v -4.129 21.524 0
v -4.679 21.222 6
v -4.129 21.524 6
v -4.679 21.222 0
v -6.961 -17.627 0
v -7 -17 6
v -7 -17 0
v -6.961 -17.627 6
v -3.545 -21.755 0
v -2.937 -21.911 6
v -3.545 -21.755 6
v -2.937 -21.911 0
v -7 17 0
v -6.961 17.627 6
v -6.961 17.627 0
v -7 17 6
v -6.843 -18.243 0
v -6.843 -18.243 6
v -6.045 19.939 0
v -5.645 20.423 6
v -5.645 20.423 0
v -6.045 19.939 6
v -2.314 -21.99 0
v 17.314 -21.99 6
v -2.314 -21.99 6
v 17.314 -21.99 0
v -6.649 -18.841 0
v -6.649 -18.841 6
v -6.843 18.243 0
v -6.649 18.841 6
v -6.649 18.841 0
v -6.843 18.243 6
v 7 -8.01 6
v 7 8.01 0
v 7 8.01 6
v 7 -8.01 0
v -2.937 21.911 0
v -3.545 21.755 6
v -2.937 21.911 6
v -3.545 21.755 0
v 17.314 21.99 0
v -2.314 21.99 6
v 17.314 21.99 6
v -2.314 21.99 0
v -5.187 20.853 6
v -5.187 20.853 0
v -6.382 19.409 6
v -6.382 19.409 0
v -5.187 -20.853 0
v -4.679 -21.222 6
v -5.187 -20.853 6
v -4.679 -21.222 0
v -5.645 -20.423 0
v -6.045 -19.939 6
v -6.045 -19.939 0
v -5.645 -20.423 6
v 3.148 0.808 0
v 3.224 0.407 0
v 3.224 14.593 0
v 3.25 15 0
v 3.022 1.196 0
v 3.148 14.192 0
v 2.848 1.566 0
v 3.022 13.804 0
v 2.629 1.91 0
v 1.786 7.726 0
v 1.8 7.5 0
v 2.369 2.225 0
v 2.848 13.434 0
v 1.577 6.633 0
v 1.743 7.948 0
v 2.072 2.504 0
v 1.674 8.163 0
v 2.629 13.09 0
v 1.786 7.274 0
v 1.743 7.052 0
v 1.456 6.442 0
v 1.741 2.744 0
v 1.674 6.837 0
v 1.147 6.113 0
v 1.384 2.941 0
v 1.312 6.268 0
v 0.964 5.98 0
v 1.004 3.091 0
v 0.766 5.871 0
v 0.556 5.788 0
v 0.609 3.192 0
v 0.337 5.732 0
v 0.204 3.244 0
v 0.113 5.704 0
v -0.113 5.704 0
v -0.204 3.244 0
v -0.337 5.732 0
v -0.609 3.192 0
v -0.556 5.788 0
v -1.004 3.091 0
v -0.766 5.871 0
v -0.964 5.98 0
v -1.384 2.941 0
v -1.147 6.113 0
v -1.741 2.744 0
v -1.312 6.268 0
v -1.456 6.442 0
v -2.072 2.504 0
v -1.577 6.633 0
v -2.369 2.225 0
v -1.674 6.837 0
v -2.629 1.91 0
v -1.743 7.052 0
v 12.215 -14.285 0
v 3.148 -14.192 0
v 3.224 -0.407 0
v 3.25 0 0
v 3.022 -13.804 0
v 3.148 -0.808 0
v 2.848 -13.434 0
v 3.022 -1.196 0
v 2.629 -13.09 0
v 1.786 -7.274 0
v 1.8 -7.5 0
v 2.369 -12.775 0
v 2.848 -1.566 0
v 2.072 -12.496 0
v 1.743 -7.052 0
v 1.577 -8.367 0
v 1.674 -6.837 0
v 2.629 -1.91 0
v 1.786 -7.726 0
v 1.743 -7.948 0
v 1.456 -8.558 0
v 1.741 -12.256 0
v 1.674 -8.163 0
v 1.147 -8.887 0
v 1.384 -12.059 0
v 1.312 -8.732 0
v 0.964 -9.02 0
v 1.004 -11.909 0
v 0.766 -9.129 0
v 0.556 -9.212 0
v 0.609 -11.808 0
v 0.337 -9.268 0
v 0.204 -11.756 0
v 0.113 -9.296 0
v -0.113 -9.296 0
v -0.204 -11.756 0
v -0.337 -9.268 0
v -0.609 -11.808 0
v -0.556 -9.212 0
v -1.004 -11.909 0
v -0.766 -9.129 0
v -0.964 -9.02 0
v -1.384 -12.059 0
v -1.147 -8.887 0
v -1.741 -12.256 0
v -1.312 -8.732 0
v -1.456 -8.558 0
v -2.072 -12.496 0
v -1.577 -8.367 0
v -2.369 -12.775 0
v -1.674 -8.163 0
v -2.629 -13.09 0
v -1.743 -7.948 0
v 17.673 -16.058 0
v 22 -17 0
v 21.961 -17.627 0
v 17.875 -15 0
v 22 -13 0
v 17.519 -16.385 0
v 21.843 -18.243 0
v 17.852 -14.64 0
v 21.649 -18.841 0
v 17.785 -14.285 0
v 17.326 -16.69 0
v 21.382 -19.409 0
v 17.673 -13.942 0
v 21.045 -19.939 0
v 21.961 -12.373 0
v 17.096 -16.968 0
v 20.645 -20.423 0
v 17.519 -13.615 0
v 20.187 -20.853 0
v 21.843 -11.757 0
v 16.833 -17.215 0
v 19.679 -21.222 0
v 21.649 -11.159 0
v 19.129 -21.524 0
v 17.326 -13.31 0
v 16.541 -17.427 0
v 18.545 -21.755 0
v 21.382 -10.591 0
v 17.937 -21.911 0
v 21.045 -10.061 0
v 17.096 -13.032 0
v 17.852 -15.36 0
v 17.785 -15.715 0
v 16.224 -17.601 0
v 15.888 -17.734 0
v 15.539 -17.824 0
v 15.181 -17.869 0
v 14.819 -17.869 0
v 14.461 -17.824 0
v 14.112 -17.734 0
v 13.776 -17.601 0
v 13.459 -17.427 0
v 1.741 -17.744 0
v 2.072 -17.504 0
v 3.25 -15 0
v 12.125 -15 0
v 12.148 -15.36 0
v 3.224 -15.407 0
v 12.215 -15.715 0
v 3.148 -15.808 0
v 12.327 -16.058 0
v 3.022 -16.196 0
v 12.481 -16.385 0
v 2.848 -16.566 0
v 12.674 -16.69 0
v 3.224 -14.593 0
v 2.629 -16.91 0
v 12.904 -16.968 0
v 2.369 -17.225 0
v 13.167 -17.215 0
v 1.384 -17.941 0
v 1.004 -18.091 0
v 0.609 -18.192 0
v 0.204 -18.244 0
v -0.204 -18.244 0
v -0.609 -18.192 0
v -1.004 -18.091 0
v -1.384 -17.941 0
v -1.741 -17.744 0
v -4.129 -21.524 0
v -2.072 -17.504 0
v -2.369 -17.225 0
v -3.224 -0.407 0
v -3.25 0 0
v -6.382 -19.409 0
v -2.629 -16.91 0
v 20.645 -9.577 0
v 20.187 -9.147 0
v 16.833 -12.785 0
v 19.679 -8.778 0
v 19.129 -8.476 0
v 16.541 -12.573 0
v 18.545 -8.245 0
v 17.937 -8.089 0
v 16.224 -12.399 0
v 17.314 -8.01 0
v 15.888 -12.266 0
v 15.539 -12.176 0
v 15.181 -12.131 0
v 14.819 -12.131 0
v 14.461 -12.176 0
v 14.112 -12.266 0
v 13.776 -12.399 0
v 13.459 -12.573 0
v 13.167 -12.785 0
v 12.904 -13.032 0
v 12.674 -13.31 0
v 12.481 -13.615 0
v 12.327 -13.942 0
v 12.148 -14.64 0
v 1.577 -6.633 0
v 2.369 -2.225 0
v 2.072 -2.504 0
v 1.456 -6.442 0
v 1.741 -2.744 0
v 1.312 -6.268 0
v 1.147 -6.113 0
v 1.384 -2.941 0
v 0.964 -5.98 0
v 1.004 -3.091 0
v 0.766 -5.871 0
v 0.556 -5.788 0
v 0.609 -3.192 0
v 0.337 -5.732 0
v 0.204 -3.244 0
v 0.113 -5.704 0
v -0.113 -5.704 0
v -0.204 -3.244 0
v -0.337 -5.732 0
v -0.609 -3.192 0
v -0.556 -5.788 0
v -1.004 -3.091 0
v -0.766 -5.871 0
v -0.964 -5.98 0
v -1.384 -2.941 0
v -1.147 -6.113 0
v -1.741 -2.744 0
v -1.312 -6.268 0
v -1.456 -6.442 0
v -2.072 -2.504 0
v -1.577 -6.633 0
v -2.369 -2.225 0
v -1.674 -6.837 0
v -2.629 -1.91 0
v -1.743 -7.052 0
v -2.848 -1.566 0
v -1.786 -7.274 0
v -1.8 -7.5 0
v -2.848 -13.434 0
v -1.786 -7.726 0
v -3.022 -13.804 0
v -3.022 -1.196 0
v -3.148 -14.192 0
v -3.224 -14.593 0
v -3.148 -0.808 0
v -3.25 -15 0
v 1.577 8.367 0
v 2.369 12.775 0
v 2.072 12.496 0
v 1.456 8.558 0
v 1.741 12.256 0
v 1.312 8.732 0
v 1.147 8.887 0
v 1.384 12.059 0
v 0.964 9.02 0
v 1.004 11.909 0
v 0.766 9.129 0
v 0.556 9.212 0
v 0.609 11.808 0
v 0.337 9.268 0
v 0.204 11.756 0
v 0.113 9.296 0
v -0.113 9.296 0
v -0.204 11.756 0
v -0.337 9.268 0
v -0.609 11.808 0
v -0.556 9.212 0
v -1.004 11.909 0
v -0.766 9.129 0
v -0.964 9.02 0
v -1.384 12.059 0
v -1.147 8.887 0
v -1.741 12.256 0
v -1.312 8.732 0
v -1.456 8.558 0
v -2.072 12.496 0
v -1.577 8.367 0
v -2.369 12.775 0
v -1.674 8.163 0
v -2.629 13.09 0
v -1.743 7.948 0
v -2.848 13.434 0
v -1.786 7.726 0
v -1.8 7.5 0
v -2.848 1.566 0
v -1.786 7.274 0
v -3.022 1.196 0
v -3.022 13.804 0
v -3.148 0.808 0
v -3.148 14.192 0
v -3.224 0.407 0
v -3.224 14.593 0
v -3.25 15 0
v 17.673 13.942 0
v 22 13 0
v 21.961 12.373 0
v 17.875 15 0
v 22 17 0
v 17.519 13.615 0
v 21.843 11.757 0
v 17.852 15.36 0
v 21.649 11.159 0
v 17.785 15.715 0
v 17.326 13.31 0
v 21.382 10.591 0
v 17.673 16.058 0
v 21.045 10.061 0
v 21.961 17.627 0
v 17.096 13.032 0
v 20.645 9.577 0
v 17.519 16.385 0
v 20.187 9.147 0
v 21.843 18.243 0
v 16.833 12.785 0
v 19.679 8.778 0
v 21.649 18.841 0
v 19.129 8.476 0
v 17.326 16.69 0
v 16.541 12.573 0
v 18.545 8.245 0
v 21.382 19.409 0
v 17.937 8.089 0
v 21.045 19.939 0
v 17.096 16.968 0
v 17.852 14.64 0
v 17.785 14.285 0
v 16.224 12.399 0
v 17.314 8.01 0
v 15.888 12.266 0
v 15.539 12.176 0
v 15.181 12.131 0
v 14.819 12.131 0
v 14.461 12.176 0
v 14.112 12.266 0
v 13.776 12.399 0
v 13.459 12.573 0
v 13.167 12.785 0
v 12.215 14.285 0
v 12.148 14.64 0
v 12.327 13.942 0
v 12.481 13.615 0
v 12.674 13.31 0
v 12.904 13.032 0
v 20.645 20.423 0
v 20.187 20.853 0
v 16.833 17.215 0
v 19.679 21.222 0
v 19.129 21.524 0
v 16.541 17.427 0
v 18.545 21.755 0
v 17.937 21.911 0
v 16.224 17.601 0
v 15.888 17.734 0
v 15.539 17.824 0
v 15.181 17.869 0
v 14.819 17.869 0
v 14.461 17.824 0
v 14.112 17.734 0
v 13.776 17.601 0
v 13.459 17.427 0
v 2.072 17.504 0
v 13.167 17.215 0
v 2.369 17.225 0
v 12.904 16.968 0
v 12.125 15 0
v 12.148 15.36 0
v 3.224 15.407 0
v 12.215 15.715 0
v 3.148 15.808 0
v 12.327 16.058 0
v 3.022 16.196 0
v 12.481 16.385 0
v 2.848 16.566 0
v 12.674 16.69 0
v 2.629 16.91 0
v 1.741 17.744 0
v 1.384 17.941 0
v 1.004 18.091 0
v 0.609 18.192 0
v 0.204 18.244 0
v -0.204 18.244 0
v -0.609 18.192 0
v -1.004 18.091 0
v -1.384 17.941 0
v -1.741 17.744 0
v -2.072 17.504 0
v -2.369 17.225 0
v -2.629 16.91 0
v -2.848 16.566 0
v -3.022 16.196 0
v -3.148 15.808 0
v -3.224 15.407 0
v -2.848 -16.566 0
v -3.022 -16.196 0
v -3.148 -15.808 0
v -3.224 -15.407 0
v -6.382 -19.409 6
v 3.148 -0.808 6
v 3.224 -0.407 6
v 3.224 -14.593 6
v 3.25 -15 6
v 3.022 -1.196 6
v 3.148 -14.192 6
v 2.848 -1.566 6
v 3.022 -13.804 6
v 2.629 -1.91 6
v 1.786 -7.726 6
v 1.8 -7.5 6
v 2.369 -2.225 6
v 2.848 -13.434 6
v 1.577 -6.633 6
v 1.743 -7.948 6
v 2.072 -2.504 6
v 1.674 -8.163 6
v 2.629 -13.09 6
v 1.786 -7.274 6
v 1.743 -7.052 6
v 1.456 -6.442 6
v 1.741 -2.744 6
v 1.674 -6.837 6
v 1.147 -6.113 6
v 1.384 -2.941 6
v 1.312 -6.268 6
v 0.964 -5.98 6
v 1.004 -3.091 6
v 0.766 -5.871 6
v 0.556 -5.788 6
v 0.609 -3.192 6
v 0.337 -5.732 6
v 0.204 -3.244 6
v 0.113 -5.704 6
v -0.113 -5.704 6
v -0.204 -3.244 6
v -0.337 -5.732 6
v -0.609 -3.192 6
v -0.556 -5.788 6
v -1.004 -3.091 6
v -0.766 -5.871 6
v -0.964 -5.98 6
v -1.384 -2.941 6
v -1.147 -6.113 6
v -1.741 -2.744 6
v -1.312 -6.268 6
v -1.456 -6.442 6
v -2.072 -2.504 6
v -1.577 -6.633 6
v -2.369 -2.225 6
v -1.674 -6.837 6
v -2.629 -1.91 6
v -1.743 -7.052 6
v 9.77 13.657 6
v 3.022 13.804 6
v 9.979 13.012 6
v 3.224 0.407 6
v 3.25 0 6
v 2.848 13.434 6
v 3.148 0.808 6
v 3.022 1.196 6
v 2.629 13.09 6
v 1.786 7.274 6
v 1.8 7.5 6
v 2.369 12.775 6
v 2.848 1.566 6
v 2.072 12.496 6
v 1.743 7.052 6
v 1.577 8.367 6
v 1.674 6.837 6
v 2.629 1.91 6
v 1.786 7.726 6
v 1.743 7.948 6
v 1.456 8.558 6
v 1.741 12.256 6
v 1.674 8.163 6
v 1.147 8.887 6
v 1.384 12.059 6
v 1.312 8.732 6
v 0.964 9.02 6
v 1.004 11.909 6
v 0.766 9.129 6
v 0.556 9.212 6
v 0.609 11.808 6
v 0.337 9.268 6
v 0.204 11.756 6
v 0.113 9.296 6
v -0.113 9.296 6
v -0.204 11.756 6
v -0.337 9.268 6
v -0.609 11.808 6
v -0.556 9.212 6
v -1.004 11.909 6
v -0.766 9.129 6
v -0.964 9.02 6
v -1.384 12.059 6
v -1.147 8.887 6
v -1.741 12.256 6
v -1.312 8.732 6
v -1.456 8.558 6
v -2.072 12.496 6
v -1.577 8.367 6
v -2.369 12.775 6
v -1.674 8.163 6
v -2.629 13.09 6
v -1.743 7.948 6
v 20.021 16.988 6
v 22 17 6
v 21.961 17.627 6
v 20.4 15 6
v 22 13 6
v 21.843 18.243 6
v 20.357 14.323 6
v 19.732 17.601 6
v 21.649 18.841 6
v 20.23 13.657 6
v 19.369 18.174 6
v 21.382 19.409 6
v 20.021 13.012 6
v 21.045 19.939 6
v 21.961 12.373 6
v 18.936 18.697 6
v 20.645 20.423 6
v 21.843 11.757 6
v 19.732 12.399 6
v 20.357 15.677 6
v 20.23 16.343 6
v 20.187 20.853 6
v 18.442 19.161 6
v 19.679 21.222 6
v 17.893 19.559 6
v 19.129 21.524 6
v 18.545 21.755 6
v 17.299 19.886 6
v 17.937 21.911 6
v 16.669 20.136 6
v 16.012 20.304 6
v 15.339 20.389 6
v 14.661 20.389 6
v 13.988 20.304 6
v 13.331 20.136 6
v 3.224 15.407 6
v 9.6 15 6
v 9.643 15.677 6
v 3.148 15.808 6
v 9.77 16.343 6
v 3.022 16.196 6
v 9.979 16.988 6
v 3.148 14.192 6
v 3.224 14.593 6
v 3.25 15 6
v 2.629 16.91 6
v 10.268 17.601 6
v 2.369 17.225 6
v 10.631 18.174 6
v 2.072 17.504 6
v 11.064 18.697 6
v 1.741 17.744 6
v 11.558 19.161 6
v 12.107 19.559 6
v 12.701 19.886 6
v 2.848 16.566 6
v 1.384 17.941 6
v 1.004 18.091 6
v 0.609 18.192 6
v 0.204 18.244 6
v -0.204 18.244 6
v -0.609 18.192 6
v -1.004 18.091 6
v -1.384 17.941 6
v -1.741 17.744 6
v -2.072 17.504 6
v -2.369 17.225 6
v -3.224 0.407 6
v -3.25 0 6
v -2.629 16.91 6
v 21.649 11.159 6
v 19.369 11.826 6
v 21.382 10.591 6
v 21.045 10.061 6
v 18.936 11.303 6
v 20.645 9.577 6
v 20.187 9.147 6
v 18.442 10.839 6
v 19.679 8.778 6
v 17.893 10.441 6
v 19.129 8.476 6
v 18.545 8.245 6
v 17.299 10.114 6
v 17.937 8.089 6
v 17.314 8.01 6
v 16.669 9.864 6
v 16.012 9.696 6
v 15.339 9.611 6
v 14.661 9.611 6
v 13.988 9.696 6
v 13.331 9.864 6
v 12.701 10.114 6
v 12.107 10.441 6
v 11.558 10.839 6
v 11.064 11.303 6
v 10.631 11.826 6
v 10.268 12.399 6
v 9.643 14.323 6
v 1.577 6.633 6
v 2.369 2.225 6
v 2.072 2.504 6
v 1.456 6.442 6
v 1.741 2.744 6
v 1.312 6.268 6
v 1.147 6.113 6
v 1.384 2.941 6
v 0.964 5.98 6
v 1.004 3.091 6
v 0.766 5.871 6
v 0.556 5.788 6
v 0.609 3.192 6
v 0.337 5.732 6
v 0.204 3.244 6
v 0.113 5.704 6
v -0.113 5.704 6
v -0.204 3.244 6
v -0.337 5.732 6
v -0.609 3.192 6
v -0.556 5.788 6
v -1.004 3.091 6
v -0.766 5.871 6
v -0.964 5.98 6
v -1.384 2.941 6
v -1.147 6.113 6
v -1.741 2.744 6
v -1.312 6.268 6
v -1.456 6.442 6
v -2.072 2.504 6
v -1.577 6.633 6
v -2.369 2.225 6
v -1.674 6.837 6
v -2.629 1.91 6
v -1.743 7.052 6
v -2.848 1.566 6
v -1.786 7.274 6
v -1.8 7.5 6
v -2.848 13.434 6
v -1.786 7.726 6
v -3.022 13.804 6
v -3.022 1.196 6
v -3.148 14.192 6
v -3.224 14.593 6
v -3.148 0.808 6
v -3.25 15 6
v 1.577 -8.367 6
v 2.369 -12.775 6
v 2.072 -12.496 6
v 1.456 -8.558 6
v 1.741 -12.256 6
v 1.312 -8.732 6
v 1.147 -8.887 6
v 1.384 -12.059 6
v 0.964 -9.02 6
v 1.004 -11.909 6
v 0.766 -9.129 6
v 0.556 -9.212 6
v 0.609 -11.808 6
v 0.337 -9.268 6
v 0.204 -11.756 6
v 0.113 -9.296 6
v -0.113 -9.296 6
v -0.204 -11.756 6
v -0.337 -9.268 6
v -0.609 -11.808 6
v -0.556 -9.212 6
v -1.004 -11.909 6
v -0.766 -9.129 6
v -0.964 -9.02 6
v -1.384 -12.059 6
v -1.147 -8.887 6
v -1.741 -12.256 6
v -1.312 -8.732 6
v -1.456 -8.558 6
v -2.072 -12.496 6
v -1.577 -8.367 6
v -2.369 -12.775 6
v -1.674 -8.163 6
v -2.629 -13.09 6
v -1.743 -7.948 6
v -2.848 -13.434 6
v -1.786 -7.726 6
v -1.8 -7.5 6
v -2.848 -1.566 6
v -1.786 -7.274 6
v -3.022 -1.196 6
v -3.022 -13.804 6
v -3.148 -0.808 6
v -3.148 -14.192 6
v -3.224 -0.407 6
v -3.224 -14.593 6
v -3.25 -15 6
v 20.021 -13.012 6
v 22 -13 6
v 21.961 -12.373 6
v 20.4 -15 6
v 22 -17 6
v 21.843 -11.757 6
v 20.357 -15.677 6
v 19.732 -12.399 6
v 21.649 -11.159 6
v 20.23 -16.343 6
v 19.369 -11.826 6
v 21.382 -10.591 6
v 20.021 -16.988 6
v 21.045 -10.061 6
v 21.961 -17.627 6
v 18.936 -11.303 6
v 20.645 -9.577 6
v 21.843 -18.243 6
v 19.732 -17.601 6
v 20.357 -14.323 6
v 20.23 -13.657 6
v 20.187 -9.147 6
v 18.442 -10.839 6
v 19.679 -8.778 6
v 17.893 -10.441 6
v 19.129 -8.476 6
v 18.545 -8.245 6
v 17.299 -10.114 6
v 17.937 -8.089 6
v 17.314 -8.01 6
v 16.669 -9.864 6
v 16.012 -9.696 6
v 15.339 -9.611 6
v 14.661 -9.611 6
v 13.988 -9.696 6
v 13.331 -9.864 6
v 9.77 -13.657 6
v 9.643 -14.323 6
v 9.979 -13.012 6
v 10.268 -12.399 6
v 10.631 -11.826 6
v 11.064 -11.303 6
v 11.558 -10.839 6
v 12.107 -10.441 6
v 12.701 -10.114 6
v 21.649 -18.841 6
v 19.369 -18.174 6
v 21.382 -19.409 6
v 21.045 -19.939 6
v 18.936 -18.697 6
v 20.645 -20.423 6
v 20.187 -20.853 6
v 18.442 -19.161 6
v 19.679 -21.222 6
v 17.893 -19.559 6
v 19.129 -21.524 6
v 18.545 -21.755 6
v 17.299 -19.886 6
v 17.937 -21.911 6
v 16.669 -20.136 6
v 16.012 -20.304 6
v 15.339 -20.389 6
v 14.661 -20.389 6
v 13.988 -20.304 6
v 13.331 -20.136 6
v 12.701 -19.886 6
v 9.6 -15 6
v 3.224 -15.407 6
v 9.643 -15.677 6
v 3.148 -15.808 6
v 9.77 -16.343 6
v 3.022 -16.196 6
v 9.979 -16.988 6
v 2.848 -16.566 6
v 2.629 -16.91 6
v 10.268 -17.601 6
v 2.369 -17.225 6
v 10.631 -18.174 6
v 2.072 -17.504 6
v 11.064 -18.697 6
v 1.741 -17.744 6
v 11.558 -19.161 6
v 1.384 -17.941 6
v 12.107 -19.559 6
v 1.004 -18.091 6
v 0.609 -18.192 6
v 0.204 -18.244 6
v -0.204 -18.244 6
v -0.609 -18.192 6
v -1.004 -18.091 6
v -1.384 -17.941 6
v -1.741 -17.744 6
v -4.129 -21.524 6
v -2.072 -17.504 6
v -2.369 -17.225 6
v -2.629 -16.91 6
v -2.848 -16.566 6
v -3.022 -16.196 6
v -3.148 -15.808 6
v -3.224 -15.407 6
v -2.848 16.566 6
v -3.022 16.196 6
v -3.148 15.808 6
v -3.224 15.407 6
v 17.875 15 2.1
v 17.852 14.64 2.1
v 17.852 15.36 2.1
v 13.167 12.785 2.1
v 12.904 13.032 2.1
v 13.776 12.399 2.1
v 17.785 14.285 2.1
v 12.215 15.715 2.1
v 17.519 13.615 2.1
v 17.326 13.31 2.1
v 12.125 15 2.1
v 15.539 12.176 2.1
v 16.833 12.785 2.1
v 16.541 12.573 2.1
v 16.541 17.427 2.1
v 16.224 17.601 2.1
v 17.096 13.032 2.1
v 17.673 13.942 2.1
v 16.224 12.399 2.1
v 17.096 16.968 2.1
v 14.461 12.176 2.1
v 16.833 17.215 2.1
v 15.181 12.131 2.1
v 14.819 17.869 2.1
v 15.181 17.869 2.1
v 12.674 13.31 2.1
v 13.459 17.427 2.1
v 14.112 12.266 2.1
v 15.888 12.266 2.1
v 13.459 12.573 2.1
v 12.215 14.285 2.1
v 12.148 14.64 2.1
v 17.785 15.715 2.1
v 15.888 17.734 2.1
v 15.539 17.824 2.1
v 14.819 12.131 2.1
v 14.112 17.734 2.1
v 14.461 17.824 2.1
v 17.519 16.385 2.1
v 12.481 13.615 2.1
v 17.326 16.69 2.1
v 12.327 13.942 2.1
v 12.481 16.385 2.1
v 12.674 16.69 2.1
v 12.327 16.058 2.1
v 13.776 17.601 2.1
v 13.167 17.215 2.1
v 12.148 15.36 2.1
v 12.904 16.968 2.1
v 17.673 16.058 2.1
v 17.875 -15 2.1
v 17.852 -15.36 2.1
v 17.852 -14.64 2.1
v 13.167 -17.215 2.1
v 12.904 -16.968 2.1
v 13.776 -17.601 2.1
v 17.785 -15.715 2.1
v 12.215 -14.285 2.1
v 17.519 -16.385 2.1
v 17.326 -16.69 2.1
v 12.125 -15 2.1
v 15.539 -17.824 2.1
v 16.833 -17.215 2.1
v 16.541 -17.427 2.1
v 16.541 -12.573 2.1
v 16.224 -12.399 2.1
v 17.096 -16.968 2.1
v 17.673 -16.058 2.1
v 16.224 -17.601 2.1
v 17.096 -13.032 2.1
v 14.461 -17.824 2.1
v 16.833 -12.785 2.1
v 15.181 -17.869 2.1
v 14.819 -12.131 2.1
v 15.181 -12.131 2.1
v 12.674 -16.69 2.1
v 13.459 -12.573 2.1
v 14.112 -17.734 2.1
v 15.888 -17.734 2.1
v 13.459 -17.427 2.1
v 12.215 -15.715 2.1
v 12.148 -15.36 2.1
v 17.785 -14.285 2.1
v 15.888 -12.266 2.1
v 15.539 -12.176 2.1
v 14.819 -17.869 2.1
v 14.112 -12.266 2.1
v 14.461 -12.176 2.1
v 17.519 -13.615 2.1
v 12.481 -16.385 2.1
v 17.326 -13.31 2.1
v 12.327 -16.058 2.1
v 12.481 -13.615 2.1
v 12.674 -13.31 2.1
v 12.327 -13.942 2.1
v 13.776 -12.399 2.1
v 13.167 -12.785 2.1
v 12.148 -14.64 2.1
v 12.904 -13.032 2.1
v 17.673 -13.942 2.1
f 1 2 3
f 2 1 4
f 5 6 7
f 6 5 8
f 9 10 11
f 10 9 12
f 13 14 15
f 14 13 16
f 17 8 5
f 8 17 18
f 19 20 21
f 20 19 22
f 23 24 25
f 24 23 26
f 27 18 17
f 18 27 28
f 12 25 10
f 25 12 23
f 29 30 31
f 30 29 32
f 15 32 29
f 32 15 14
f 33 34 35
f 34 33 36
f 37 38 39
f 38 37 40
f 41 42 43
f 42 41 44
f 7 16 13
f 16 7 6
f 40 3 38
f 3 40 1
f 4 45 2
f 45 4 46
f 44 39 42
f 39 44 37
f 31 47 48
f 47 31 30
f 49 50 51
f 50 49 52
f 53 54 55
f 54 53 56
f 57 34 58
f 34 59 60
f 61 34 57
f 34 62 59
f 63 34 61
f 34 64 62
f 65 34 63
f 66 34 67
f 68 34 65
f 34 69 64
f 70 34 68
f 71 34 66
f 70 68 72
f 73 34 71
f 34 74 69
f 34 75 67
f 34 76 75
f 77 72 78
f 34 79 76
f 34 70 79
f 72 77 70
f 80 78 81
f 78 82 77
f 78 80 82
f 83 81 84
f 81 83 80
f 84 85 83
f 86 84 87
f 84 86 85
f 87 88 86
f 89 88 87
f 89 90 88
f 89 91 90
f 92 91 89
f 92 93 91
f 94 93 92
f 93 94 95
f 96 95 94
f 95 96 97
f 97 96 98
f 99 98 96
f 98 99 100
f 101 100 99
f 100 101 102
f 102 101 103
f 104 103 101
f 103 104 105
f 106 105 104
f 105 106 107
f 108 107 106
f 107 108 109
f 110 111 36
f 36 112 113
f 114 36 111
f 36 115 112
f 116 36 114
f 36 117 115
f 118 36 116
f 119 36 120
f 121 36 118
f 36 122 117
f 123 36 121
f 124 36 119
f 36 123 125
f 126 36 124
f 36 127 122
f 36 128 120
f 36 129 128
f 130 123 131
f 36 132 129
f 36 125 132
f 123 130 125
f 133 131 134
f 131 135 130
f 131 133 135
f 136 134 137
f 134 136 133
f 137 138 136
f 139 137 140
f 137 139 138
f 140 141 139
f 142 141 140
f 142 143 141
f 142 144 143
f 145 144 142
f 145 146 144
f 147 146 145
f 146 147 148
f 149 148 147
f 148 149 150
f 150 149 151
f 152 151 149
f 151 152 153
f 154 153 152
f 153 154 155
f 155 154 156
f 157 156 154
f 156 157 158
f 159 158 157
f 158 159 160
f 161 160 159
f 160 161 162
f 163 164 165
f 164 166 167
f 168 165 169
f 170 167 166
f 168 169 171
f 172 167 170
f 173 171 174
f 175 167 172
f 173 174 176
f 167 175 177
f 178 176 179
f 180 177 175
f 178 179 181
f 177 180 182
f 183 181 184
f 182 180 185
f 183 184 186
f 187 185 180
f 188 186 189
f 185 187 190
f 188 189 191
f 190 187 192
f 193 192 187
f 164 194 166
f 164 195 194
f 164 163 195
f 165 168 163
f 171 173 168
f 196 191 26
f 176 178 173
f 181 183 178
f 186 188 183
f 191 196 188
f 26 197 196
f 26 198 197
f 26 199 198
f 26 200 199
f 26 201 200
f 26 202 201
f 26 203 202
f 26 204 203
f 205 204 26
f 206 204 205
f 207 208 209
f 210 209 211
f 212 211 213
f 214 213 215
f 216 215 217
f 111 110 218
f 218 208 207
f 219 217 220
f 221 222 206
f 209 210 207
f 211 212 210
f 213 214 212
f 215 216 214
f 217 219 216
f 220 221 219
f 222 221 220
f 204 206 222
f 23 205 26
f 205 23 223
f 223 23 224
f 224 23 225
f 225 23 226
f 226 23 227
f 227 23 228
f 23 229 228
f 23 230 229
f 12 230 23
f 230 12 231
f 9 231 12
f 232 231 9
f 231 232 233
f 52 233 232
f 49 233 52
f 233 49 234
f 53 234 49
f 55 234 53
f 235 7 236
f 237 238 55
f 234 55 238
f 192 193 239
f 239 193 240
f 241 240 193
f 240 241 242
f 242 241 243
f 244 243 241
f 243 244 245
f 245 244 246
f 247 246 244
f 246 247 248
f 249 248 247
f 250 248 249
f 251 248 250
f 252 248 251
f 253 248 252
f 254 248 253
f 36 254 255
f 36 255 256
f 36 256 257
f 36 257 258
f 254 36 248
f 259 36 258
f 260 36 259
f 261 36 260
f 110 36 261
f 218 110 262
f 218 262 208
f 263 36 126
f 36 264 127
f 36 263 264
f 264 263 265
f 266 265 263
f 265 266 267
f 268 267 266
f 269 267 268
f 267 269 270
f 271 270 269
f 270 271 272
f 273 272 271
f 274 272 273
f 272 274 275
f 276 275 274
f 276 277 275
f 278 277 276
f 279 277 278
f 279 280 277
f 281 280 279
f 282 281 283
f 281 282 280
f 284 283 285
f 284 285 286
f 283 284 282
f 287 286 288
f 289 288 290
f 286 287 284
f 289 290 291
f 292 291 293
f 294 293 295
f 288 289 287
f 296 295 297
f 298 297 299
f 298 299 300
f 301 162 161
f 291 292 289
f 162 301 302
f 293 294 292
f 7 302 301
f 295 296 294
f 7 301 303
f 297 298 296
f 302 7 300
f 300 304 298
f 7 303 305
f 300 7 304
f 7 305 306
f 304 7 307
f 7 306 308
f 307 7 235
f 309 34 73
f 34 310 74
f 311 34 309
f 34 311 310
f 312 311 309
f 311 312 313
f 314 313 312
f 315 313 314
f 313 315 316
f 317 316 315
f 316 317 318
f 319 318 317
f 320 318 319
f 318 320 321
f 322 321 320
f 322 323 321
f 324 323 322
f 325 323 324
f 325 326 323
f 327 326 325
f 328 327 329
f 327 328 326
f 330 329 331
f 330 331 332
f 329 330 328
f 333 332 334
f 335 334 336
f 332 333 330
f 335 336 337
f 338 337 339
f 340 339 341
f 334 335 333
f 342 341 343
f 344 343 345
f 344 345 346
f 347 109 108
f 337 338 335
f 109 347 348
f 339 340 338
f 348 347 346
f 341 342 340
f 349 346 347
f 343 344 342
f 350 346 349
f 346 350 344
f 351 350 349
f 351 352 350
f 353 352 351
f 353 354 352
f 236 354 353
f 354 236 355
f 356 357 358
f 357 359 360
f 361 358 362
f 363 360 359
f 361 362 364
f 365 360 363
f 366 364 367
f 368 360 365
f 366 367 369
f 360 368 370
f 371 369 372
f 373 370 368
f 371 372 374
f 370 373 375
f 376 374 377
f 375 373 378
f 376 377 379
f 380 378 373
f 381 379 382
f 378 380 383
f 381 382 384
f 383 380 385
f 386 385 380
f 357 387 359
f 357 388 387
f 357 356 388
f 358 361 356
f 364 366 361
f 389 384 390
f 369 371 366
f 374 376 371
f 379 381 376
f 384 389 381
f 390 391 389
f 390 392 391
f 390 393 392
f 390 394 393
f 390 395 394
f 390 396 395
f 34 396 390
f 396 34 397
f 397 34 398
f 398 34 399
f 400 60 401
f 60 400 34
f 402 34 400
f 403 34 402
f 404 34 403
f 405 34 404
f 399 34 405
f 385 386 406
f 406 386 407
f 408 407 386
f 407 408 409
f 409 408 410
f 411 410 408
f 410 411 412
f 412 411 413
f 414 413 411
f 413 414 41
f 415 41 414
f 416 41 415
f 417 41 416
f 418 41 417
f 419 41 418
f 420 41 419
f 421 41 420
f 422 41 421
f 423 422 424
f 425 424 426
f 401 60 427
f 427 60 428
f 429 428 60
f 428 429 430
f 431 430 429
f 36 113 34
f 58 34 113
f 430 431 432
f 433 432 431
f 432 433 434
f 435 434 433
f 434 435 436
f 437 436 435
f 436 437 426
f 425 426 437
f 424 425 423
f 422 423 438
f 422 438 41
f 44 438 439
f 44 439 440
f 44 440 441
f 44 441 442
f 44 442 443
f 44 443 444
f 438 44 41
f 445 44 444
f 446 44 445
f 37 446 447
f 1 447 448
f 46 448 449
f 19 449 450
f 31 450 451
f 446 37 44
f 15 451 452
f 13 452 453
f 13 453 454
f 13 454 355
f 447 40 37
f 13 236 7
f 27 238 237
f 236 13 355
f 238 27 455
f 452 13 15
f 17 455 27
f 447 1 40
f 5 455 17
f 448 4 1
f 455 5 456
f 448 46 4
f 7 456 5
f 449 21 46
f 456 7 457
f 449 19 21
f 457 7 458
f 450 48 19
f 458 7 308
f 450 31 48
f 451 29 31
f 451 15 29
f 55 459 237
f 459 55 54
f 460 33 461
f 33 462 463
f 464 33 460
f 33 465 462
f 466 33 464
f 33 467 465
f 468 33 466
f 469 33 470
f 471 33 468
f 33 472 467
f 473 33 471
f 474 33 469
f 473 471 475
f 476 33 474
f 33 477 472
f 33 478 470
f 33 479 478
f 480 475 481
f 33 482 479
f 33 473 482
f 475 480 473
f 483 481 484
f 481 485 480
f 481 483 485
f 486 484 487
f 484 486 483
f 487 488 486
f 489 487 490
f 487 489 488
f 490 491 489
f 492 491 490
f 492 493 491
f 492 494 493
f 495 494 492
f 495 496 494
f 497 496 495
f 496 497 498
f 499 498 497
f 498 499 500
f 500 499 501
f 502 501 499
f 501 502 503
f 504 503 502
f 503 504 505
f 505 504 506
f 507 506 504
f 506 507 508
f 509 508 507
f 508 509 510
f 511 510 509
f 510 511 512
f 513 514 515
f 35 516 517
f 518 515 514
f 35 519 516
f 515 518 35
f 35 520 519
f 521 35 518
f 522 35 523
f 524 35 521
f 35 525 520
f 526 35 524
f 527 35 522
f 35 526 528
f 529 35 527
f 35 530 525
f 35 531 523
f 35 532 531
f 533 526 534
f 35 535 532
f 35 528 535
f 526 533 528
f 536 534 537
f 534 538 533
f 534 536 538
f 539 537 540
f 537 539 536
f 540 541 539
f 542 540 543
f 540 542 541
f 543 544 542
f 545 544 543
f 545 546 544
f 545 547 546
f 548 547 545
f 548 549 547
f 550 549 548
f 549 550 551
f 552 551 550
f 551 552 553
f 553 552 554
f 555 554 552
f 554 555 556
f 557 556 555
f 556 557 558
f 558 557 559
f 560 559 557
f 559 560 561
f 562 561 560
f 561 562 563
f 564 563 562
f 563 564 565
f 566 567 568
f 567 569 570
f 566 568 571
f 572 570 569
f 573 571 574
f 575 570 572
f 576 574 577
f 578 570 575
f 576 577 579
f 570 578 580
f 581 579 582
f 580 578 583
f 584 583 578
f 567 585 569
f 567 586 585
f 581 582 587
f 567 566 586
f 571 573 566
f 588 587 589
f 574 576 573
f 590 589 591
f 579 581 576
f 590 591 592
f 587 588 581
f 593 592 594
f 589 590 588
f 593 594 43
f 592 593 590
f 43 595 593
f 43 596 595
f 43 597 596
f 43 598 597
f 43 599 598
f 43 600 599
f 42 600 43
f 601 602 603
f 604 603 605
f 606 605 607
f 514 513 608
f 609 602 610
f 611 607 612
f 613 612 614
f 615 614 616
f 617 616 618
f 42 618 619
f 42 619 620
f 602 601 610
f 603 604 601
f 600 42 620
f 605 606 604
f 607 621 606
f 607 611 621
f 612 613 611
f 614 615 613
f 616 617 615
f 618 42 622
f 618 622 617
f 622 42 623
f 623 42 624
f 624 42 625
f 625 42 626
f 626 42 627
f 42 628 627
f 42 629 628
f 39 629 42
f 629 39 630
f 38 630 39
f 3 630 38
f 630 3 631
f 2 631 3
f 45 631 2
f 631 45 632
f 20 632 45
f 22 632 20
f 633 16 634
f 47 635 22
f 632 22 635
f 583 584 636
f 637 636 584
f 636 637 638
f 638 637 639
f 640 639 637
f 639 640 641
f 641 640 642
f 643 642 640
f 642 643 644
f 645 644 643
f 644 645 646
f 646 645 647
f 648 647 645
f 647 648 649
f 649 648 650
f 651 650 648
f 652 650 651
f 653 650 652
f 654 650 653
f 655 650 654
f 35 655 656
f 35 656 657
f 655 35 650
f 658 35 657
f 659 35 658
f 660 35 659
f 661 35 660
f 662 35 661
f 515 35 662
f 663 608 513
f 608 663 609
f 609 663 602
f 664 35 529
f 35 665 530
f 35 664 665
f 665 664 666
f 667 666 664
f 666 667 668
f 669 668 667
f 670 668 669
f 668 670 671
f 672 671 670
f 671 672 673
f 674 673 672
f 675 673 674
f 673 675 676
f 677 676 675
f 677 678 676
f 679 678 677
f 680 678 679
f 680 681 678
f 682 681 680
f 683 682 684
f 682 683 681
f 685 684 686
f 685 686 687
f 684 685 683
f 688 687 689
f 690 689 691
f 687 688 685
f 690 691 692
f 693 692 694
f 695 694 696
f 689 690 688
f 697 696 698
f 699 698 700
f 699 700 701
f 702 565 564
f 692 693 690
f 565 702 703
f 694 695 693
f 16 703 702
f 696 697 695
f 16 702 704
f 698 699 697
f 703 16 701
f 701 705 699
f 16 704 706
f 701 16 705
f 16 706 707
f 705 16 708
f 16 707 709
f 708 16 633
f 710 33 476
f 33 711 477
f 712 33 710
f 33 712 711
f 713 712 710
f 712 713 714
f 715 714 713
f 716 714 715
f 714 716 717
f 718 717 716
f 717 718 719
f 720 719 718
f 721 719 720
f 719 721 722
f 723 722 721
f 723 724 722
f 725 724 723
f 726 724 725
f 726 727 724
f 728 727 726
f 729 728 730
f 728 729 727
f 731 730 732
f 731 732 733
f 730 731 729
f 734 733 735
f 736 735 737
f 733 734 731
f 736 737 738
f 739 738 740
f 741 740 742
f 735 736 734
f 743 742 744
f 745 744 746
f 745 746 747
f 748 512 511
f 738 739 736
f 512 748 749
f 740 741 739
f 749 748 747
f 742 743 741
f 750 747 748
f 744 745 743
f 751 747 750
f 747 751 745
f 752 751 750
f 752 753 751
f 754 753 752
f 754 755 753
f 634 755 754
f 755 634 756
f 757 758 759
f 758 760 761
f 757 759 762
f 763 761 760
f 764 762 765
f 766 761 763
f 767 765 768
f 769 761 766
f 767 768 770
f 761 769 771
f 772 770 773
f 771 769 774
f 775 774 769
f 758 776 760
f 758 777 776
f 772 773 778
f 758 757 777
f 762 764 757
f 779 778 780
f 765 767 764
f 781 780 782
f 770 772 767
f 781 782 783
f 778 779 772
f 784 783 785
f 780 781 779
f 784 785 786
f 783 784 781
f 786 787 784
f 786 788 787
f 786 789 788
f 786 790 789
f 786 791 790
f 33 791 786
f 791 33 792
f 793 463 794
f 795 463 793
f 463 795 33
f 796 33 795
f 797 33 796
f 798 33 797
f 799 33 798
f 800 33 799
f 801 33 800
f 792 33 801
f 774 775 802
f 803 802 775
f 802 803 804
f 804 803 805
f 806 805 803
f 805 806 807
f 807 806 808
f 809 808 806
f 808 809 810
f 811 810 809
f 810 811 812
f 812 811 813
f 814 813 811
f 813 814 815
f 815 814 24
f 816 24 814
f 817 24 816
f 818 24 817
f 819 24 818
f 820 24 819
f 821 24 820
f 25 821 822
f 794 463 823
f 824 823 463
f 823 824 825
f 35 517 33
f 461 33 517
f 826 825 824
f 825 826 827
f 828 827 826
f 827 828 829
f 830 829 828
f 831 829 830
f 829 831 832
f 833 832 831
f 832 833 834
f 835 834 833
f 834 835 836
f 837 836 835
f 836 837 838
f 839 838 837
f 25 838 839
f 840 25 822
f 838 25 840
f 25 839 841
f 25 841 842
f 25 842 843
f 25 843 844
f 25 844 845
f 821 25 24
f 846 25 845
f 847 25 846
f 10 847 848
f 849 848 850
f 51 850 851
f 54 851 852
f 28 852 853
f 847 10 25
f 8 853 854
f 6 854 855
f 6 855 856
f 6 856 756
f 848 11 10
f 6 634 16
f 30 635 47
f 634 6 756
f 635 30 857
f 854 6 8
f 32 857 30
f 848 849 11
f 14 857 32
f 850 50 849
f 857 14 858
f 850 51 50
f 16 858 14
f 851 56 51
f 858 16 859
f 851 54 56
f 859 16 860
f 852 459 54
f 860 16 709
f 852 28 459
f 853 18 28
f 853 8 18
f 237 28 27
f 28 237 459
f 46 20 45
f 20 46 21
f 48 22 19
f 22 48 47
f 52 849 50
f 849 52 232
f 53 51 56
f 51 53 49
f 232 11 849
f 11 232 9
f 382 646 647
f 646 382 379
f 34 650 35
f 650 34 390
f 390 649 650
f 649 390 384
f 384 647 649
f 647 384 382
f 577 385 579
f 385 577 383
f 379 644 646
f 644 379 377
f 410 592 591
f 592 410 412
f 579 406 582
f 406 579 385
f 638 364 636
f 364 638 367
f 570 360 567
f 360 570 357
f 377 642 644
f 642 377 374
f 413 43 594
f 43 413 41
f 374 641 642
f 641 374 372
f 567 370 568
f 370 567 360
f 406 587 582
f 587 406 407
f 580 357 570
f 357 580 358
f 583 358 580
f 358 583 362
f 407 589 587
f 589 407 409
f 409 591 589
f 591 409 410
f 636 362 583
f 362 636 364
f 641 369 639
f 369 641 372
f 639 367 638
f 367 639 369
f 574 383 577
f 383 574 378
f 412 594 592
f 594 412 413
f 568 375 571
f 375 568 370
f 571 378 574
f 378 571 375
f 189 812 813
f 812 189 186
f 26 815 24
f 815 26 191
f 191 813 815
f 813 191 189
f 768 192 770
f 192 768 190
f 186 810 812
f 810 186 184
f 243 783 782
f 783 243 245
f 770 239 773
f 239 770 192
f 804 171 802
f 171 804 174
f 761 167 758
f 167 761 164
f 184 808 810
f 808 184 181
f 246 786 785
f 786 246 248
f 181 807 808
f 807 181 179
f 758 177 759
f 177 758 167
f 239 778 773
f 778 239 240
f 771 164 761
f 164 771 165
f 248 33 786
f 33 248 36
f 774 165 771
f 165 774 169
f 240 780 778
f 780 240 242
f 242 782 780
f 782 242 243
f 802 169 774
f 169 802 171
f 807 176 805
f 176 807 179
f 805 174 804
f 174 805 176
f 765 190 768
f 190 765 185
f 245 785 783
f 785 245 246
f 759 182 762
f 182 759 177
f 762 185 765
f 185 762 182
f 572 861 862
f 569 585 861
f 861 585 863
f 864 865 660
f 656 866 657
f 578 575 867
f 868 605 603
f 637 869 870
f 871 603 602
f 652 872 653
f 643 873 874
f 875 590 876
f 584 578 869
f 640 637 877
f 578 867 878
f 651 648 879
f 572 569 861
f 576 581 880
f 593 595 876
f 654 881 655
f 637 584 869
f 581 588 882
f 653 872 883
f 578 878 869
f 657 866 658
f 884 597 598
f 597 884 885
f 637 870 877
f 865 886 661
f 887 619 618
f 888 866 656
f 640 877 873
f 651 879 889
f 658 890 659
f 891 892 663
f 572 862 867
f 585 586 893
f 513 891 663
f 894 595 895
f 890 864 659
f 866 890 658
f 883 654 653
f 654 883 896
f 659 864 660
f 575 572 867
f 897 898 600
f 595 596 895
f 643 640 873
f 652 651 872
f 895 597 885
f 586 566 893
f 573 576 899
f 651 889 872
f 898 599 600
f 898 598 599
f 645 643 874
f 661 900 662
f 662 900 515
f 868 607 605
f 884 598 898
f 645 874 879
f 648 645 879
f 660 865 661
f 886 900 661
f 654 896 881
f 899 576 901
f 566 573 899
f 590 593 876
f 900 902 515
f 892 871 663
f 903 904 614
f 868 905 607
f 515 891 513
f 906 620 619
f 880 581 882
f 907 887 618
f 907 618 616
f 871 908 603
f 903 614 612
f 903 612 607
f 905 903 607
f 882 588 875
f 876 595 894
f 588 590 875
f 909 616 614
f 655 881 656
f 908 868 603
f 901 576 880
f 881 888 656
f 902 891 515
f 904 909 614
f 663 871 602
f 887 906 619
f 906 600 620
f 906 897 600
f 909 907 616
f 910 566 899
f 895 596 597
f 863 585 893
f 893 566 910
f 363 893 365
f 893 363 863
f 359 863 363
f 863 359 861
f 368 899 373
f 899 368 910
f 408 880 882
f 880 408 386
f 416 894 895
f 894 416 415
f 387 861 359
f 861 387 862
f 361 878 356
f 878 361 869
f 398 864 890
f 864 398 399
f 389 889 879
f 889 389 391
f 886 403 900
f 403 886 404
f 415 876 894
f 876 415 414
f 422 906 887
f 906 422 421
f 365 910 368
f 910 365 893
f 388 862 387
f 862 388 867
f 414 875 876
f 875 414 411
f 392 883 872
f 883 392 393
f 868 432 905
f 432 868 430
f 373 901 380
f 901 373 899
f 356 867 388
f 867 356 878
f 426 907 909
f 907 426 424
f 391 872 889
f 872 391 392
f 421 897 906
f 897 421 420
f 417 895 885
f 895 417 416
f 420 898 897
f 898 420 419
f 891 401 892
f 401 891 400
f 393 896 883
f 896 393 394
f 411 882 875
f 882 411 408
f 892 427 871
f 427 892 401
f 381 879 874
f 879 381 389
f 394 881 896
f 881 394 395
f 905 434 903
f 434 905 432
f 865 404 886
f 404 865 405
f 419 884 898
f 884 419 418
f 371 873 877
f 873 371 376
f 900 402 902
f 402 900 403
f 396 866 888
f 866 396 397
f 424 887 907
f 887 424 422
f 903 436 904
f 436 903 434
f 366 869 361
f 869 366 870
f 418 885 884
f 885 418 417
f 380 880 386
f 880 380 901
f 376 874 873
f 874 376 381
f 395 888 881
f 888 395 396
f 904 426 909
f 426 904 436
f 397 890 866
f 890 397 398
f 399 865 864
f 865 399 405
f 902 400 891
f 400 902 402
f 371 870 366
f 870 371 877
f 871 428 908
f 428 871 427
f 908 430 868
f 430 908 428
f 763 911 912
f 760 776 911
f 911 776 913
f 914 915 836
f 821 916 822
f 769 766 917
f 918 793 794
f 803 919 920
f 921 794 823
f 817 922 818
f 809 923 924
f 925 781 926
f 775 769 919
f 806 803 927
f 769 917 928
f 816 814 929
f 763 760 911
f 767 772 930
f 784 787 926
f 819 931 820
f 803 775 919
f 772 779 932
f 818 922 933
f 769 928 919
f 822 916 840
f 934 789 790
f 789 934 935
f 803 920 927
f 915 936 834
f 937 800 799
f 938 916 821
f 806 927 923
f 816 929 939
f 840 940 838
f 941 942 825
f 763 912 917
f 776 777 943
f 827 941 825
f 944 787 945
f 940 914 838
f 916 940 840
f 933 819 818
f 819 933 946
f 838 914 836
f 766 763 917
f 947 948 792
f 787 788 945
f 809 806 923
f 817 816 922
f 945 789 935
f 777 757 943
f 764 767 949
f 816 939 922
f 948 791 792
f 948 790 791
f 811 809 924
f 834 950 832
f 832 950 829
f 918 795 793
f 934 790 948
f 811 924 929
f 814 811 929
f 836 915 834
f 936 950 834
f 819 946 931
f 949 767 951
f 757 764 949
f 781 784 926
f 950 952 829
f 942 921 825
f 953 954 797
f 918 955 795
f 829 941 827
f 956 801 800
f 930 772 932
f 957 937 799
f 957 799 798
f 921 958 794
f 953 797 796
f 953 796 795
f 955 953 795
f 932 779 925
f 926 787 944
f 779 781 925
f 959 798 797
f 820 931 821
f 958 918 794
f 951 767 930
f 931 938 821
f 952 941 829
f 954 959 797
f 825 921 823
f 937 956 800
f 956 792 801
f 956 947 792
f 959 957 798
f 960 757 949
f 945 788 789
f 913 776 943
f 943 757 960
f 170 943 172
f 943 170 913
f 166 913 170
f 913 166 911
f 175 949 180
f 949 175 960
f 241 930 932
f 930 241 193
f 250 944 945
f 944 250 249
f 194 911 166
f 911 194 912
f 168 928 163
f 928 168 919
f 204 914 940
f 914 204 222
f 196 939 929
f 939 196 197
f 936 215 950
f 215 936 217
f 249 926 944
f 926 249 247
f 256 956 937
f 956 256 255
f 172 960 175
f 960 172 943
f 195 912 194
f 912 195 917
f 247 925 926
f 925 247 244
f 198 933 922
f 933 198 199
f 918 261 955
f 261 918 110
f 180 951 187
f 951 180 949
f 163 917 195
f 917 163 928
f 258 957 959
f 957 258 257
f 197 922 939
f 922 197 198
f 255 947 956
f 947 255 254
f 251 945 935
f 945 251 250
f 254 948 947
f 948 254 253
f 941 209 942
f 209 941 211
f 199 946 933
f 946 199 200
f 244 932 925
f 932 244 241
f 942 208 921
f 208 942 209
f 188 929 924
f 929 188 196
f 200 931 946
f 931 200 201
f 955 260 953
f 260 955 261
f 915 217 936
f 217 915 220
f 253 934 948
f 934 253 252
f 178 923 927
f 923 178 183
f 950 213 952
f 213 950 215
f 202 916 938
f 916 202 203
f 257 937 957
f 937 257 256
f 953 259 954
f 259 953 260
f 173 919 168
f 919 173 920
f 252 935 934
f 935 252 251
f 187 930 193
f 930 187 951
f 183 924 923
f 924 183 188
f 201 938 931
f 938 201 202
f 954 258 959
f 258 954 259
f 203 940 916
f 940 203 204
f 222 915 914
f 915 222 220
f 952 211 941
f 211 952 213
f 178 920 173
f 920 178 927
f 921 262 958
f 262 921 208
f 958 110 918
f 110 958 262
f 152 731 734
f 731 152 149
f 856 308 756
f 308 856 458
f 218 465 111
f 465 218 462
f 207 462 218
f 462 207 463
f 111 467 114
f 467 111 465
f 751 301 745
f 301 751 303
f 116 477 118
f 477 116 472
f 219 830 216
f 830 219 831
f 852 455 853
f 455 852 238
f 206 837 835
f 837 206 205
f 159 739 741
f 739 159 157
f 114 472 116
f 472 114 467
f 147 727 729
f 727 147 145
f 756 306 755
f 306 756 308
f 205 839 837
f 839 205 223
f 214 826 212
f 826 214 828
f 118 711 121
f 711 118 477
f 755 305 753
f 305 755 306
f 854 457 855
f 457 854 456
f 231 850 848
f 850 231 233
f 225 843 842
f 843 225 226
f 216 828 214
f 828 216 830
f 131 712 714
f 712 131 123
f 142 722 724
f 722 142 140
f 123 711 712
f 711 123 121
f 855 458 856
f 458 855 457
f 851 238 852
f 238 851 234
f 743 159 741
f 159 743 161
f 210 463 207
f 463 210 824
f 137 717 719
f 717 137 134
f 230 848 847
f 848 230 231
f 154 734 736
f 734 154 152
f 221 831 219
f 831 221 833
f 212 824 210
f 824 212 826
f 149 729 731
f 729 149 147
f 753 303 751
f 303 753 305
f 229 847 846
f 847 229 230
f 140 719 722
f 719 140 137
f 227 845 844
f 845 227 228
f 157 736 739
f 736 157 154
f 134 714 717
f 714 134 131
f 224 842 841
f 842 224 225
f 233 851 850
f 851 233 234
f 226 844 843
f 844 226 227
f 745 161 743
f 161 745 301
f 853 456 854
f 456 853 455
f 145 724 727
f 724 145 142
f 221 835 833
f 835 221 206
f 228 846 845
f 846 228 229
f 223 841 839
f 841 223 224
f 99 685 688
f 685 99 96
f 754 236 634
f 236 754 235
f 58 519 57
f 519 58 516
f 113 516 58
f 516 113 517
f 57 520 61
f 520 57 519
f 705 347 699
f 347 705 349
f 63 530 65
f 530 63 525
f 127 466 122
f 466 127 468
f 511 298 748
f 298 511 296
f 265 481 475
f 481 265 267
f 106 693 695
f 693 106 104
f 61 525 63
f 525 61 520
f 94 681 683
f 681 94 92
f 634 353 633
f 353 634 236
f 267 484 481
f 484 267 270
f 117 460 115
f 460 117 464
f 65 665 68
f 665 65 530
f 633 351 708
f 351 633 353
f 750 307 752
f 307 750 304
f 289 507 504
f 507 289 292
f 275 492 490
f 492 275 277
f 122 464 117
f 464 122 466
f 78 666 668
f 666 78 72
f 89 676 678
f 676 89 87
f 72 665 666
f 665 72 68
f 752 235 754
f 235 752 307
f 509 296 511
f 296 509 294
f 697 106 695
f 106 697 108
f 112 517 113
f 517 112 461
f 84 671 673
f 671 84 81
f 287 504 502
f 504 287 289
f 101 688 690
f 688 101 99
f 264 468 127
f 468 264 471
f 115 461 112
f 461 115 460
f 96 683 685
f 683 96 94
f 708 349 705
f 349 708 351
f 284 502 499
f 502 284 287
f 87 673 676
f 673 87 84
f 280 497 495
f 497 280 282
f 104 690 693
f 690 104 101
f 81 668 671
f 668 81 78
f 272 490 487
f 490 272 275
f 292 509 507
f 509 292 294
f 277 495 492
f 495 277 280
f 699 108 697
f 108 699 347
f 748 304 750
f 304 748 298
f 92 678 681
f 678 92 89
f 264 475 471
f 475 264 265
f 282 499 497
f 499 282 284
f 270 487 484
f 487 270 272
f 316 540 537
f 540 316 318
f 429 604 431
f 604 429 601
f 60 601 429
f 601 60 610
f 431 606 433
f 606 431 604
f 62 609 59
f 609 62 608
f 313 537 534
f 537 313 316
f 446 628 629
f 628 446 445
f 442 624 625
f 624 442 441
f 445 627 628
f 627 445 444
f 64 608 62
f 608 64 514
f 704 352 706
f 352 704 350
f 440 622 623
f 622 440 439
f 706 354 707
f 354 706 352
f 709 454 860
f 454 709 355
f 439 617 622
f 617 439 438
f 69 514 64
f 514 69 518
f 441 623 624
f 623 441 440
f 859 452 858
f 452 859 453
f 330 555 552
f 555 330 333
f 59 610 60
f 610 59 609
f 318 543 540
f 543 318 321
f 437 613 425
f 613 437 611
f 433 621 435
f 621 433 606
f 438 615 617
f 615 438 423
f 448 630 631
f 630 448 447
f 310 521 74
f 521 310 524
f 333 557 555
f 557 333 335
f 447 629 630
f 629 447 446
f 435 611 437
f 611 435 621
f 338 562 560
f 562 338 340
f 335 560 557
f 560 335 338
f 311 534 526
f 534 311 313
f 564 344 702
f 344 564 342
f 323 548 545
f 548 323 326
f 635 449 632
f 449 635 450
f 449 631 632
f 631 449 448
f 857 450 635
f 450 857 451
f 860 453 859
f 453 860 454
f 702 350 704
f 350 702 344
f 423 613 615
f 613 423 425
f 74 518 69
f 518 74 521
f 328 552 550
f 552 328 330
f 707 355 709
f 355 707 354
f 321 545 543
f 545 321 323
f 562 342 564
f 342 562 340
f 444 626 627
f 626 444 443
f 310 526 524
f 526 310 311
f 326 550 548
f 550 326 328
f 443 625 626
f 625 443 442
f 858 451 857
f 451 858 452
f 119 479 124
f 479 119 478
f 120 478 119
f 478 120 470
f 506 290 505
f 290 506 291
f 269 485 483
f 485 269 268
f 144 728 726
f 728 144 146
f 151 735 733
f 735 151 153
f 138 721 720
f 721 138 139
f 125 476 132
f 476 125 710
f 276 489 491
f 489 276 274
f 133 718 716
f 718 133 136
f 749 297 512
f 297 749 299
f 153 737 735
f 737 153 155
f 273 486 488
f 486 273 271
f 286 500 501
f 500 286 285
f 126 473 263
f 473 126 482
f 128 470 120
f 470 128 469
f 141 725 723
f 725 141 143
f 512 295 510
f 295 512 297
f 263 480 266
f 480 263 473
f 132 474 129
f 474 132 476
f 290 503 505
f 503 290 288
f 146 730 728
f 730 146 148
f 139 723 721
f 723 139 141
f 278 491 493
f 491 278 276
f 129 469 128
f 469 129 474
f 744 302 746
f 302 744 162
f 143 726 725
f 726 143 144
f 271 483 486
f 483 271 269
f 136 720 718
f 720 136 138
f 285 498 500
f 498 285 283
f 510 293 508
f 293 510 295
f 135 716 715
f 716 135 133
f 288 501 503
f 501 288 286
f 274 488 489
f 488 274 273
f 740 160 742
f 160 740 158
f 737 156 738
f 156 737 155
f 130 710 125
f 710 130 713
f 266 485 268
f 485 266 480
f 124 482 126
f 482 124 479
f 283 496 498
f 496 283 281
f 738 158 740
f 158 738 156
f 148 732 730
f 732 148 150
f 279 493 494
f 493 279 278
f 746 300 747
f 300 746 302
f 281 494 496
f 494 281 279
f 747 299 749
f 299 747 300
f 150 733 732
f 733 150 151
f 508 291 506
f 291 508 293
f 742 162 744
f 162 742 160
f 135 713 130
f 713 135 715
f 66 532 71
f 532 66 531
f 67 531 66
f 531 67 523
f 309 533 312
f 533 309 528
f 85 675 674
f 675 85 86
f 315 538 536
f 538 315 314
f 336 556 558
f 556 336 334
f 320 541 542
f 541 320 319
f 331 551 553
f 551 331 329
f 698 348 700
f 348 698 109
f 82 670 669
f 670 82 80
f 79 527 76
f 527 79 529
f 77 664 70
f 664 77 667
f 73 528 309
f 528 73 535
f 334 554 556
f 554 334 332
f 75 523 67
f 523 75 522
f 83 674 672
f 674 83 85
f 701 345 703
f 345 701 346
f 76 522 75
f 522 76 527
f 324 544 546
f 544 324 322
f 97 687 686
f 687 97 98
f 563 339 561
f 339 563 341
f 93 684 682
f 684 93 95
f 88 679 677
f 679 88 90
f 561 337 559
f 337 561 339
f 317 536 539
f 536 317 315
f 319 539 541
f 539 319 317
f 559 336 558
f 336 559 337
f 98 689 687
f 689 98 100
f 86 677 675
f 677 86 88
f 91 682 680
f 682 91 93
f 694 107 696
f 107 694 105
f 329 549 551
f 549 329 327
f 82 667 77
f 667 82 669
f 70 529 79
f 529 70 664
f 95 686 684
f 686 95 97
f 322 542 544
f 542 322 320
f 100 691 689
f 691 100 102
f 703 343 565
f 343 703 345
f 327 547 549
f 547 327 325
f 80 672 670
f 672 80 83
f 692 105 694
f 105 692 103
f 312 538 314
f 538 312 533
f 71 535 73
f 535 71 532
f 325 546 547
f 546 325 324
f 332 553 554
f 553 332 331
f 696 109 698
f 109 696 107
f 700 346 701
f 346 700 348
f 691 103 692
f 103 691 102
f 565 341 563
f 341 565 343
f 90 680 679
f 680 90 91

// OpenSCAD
$fn = 50;


difference() {
	union() {
		hull() {
			translate(v = [-2.0000000000, 17.0000000000, 0]) {
				cylinder(h = 6, r = 5);
			}
			translate(v = [2.0000000000, 17.0000000000, 0]) {
				cylinder(h = 6, r = 5);
			}
			translate(v = [-2.0000000000, -17.0000000000, 0]) {
				cylinder(h = 6, r = 5);
			}
			translate(v = [2.0000000000, -17.0000000000, 0]) {
				cylinder(h = 6, r = 5);
			}
		}
		translate(v = [7.5000000000, 15.0000000000, 0]) {
			hull() {
				translate(v = [-9.5000000000, 2.0000000000, 0]) {
					cylinder(h = 6, r = 5);
				}
				translate(v = [9.5000000000, 2.0000000000, 0]) {
					cylinder(h = 6, r = 5);
				}
				translate(v = [-9.5000000000, -2.0000000000, 0]) {
					cylinder(h = 6, r = 5);
				}
				translate(v = [9.5000000000, -2.0000000000, 0]) {
					cylinder(h = 6, r = 5);
				}
			}
		}
		translate(v = [7.5000000000, -15.0000000000, 0]) {
			hull() {
				translate(v = [-9.5000000000, 2.0000000000, 0]) {
					cylinder(h = 6, r = 5);
				}
				translate(v = [9.5000000000, 2.0000000000, 0]) {
					cylinder(h = 6, r = 5);
				}
				translate(v = [-9.5000000000, -2.0000000000, 0]) {
					cylinder(h = 6, r = 5);
				}
				translate(v = [9.5000000000, -2.0000000000, 0]) {
					cylinder(h = 6, r = 5);
				}
			}
		}
	}
	union() {
		translate(v = [15.0000000000, 15.0000000000, 6]) {
			rotate(a = [0, 0, 0]) {
				difference() {
					union() {
						#translate(v = [0, 0, -6.0000000000]) {
							cylinder(h = 6, r = 2.6000000000);
						}
						#translate(v = [0, 0, -3.9000000000]) {
							cylinder(h = 3.9000000000, r1 = 2.8750000000, r2 = 5.4000000000);
						}
						#translate(v = [0, 0, -6.0000000000]) {
							cylinder(h = 6, r = 2.8750000000);
						}
						#translate(v = [0, 0, -6.0000000000]) {
							cylinder(h = 6, r = 2.6000000000);
						}
					}
					union();
				}
			}
		}
		translate(v = [15.0000000000, -15.0000000000, 6]) {
			rotate(a = [0, 0, 0]) {
				difference() {
					union() {
						#translate(v = [0, 0, -6.0000000000]) {
							cylinder(h = 6, r = 2.6000000000);
						}
						#translate(v = [0, 0, -3.9000000000]) {
							cylinder(h = 3.9000000000, r1 = 2.8750000000, r2 = 5.4000000000);
						}
						#translate(v = [0, 0, -6.0000000000]) {
							cylinder(h = 6, r = 2.8750000000);
						}
						#translate(v = [0, 0, -6.0000000000]) {
							cylinder(h = 6, r = 2.6000000000);
						}
					}
					union();
				}
			}
		}
		translate(v = [0.0000000000, -15.0000000000, 0]) {
			translate(v = [0, 0, -100]) {
				cylinder(h = 200, r = 3.2500000000);
			}
		}
		translate(v = [0, 0, -100]) {
			cylinder(h = 200, r = 3.2500000000);
		}
		translate(v = [0.0000000000, 15.0000000000, 0]) {
			translate(v = [0, 0, -100]) {
				cylinder(h = 200, r = 3.2500000000);
			}
		}
		translate(v = [0.0000000000, -15.0000000000, 0]) {
			translate(v = [0, 0, -100]) {
				cylinder(h = 200, r = 1.8000000000);
			}
		}
		translate(v = [0.0000000000, -7.5000000000, 0]) {
			translate(v = [0, 0, -100]) {
				cylinder(h = 200, r = 1.8000000000);
			}
		}
		translate(v = [0, 0, -100]) {
			cylinder(h = 200, r = 1.8000000000);
		}
		translate(v = [0.0000000000, 7.5000000000, 0]) {
			translate(v = [0, 0, -100]) {
				cylinder(h = 200, r = 1.8000000000);
			}
		}
		translate(v = [0.0000000000, 15.0000000000, 0]) {
			translate(v = [0, 0, -100]) {
				cylinder(h = 200, r = 1.8000000000);
			}
		}
	}
}
